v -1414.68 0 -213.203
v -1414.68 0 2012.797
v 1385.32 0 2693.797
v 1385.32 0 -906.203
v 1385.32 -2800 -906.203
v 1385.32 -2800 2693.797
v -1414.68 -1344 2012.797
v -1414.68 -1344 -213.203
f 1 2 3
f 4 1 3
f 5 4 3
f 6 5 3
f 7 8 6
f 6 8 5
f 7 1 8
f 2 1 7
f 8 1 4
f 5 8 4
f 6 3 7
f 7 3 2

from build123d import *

# Parameters (mm, degrees)
F0_W     = 2800
F0_H     = 3600
F1_DEPTH = 2800
F3_DEPTH = 2800
F5_DEPTH = 3600.001
F7_DEPTH = 2800


with BuildPart() as f1:
    # F0 (on Front) → F1 (new body)
    with BuildSketch(Plane.XZ):
        with Locations((-14.6795958281, 893.7970971422)):
            Rectangle(F0_W, F0_H)
    extrude(amount=F1_DEPTH)

    # F2 (on face) → F3 (cut, through all)
    with BuildSketch(Plane(origin=(0, 0, 0), x_dir=(-1, 0, 0), z_dir=(0, 1, 0))):
        Polygon((1414.6795958281, 2693.7970971422), (-1385.3204041719, 2693.7970971422), (1414.6795958281, 2012.7970971422), align=None)
    extrude(amount=-F3_DEPTH, mode=Mode.SUBTRACT)

    # F4 (on face) → F5 (cut, through all)
    with BuildSketch(Plane(origin=(0, 0, -906.2029028578), x_dir=(1, 0, 0), z_dir=(0, 0, -1))):
        Polygon((1385.3204041719, 2800), (-1414.6795958281, 2800), (-1414.6795958281, 1344), align=None)
    extrude(amount=-F5_DEPTH, mode=Mode.SUBTRACT)

    # F6 (on face) → F7 (cut)
    with BuildSketch(Plane(origin=(0, 0, 0), x_dir=(-1, 0, 0), z_dir=(0, 1, 0))):
        Polygon((-1385.3204041719, -906.2029028578), (1414.6795958281, -906.2029028578), (1414.6795958281, -213.2029028578), align=None)
    extrude(amount=-F7_DEPTH, mode=Mode.SUBTRACT)


solid = f1.part
